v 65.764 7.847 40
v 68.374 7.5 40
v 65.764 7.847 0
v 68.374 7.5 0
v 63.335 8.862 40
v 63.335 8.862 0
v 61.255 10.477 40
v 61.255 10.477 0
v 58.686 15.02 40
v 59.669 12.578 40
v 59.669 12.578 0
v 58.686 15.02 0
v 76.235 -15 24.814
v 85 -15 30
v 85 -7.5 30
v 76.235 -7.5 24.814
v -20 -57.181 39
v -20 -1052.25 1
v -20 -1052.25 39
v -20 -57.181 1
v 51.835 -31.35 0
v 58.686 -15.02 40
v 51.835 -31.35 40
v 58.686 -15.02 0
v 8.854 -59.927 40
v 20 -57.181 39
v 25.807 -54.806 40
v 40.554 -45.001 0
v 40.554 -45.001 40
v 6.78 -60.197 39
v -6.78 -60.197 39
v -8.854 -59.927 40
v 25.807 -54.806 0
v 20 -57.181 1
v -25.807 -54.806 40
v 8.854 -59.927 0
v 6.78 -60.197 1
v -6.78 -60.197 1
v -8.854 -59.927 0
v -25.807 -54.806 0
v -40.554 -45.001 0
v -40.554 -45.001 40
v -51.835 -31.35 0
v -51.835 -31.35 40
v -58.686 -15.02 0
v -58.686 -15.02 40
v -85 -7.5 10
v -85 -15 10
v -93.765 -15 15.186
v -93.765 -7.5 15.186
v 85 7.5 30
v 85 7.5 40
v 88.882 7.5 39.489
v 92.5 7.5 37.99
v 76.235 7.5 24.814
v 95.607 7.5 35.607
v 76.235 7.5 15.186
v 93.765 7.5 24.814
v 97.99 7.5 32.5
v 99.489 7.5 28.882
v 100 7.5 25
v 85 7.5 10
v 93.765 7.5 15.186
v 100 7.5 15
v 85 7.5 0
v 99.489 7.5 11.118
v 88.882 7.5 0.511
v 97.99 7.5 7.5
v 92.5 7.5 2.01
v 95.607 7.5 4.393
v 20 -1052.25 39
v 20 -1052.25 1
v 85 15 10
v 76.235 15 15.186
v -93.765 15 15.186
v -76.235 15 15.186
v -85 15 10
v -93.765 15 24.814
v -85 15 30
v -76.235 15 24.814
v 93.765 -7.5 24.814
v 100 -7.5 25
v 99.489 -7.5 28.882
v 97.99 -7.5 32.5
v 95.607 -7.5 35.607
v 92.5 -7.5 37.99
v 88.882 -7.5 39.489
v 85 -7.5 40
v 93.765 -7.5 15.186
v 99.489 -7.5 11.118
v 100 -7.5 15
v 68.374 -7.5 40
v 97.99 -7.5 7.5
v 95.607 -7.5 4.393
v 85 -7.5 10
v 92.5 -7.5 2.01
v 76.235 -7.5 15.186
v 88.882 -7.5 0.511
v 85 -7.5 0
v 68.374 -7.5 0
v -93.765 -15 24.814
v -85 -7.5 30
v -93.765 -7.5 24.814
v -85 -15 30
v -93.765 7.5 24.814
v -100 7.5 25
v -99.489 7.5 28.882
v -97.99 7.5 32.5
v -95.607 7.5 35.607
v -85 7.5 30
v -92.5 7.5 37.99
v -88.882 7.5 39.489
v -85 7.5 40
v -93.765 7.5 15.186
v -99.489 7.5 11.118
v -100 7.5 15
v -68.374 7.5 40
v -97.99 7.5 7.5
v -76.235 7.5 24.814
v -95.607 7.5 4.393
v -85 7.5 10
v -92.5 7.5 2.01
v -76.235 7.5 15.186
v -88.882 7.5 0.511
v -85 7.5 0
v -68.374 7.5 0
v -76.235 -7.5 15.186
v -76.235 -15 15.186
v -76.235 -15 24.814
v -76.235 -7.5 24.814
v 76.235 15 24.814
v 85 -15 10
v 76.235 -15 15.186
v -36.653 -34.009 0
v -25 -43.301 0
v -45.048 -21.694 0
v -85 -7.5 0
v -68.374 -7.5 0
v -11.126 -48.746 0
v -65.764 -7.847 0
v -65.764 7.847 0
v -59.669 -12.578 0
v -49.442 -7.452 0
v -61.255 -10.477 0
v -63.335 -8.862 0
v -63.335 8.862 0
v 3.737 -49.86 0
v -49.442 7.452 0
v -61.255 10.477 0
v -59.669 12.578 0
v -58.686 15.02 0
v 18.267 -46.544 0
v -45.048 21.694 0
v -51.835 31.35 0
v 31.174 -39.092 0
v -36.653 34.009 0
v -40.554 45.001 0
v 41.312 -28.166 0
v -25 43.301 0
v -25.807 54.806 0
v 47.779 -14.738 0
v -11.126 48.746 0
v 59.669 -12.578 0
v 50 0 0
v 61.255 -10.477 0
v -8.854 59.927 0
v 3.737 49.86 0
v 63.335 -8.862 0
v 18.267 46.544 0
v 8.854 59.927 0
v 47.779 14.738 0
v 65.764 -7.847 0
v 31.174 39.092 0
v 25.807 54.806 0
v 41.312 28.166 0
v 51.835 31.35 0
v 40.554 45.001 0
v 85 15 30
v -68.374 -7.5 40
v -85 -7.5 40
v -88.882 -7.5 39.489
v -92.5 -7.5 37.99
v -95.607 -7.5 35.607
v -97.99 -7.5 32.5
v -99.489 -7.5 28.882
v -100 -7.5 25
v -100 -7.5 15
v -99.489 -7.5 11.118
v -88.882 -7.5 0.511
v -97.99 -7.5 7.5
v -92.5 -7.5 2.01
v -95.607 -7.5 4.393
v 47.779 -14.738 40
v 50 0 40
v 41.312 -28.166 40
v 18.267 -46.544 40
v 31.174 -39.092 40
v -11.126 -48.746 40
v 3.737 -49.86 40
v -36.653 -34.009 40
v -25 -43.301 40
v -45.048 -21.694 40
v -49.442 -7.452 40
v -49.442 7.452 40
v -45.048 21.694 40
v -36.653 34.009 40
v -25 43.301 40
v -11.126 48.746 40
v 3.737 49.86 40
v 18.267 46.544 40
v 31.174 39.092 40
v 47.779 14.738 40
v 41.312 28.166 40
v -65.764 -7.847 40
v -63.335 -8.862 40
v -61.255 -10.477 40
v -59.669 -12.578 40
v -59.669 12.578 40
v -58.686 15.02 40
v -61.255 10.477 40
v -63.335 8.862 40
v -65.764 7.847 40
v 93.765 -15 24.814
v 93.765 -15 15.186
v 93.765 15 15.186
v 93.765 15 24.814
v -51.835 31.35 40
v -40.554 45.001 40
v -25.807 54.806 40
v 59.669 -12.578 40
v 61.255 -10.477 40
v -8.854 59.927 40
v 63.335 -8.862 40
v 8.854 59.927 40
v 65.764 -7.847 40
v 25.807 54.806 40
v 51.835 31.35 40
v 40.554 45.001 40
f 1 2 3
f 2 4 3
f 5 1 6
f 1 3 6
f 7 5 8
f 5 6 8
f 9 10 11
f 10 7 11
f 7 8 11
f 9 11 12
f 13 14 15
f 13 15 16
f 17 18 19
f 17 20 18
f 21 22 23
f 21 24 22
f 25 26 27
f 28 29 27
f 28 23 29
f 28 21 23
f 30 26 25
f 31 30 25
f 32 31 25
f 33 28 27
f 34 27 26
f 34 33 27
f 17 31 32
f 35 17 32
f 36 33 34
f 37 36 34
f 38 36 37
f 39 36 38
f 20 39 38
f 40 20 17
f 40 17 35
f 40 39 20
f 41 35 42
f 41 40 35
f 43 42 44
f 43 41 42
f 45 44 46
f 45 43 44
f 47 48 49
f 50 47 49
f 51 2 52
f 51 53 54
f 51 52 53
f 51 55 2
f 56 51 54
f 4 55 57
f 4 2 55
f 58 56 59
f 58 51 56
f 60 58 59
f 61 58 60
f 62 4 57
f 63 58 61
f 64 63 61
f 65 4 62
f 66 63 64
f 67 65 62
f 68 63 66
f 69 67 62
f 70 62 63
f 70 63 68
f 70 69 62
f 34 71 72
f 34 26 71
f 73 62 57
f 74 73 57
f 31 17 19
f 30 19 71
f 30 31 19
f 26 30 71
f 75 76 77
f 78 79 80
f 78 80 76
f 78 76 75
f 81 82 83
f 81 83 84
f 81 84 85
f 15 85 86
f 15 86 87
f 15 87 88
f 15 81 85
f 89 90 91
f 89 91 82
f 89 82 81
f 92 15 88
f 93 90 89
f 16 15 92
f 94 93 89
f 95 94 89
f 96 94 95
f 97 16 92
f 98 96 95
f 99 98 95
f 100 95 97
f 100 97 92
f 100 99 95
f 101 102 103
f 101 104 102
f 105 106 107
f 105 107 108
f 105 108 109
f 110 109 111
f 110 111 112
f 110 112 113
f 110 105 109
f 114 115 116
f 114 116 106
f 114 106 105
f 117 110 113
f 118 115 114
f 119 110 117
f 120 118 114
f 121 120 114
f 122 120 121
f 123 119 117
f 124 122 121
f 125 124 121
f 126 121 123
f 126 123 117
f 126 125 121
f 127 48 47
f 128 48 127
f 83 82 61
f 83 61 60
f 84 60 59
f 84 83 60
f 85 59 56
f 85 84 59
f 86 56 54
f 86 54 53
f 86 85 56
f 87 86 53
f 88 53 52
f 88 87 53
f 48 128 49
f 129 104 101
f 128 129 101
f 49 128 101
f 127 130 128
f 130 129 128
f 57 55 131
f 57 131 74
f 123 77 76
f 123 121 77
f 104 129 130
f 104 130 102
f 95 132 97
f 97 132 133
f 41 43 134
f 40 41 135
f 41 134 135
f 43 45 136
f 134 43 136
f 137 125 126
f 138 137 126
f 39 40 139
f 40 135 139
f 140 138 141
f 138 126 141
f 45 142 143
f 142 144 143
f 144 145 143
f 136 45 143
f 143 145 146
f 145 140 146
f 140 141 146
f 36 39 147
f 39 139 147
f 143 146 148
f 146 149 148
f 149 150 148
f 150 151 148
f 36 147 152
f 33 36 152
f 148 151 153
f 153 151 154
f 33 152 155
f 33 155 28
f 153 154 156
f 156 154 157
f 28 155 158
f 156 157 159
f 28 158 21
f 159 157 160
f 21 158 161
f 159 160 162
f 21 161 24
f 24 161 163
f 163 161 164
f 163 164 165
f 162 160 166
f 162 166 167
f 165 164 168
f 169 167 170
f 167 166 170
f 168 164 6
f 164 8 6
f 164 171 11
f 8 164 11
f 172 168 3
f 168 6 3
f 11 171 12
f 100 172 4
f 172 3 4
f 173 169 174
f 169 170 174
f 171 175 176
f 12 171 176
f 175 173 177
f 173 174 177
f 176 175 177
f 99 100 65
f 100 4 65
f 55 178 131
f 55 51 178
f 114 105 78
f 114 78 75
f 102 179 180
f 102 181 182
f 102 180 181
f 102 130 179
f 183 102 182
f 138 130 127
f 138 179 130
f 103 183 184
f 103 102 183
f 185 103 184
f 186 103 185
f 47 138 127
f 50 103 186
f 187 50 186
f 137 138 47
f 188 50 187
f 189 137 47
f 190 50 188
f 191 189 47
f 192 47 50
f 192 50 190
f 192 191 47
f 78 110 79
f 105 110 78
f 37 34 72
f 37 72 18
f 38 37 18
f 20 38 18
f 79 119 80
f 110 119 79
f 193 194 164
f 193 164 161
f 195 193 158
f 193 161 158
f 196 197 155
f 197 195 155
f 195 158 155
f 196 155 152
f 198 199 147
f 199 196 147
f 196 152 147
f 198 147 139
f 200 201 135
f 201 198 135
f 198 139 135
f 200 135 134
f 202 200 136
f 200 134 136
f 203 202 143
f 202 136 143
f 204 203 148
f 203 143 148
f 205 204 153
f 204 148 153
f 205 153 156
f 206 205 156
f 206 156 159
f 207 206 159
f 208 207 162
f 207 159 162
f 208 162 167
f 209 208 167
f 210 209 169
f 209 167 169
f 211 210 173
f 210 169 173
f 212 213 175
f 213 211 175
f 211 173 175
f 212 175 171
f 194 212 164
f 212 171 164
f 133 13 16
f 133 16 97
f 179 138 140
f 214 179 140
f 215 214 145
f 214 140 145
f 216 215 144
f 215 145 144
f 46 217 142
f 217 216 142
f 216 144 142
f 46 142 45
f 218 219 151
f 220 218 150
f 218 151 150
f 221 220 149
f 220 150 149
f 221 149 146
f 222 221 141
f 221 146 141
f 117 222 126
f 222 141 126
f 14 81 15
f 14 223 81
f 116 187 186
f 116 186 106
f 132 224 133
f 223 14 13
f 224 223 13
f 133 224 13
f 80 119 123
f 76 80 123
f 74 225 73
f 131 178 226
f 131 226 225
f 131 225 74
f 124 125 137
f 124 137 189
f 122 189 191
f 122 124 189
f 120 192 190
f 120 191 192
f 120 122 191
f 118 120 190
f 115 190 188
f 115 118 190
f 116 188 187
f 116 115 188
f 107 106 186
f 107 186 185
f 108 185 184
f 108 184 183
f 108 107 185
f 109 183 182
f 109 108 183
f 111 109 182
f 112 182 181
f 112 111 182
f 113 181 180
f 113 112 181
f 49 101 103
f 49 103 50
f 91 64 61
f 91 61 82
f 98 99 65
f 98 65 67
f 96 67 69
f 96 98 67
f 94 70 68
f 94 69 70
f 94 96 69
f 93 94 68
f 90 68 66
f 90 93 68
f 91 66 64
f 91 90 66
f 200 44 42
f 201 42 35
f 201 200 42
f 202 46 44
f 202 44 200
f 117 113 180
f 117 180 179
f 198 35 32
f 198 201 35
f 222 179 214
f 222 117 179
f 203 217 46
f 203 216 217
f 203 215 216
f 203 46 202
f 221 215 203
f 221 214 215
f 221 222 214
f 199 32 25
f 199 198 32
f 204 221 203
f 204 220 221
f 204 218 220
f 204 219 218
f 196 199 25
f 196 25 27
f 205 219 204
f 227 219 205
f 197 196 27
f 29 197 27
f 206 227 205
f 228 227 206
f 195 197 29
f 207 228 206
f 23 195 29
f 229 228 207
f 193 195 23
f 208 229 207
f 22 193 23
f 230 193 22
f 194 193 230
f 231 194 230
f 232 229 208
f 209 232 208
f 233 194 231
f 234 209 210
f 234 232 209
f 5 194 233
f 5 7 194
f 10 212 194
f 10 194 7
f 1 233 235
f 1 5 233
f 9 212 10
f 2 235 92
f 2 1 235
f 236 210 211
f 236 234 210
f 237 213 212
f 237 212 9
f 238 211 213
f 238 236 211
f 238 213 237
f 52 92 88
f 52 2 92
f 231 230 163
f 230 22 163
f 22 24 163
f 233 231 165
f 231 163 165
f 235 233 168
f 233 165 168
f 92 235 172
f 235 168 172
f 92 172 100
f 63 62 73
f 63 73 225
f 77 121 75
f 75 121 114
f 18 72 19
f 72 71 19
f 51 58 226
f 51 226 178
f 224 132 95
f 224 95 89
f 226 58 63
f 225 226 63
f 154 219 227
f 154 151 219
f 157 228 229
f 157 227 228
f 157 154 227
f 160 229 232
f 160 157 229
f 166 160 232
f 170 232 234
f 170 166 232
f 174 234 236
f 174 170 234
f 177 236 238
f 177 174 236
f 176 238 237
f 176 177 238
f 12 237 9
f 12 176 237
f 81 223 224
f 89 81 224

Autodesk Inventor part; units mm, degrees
ref_plane "YZ Plane" through (0, 0, 0) normal (1, 0, 0) x (0, 1, 0)
ref_plane "XY Plane" through (0, 0, 0) normal (0, 0, 1) x (1, 0, 0)
sketch "Skizze1" plane through (0, 0, 0) normal (0, 0, 1) x (1, 0, 0)
  circle A0 centre (0, 0) radius 50
  line L0 (100, 7.5) -> (100, -7.5)
  line L1 (-100, -7.5) -> (-100, 7.5)
  line L2 (-100, 7.5) -> (-68.374, 7.5)
  line L3 (68.374, 7.5) -> (100, 7.5)
  line L4 (100, -7.5) -> (68.374, -7.5)
  line L5 (-68.374, -7.5) -> (-100, -7.5)
  arc A1 (-58.6863, -15.0205) -> (58.6863, -15.0205) centre (0, 0) ccw
  arc A2 (58.6863, 15.0205) -> (-58.6863, 15.0205) centre (0, 0) ccw
  arc A3 (-68.374, 7.5) -> (-58.6863, 15.0205) centre (-68.374, 17.5) ccw
  arc A4 (-58.6863, -15.0205) -> (-68.374, -7.5) centre (-68.374, -17.5) ccw
  arc A5 (58.6863, 15.0205) -> (68.374, 7.5) centre (68.374, 17.5) ccw
  arc A6 (68.374, -7.5) -> (58.6863, -15.0205) centre (68.374, -17.5) ccw
  point P0 (-60.1119, 7.5)
  point P1 (60.1119, 7.5)
  point P2 (60.1119, -7.5)
  point P3 (-60.1119, -7.5)
  point P4 (-84.187, 7.5)
  point P5 (84.187, 7.5)
  point P6 (84.187, -7.5)
  point P7 (-84.187, -7.5)
  dimension "d1" = 100
  dimension "d4" = 100
  dimension "d5" = 100
  dimension "d6" = 10
  dimension "d7" = 7.5
  dimension "d8" = 7.5
extrude "Extrusion1" add sketch "Skizze1" along normal blind 40
fillet "Rundung1" radius 15 4 edges at (100, 0, 40) (100, 0, 0) (-100, 0, 40) (-100, 0, 0)
sketch "Skizze3" plane through (0, 0, 0) normal (0, 1, 0) x (-1, 0, 0)
  circle A0 centre (-85, 20) radius 10 construction
  line L0 (-85, 10) -> (-93.7649, 15.1858)
  line L1 (-93.7649, 24.8142) -> (-85, 30)
  line L2 (-85, 30) -> (-76.2351, 24.8142)
  line L3 (-76.2351, 24.8142) -> (-76.2351, 15.1858)
  line L4 (-85, 10) -> (-76.2351, 15.1858)
  line L5 (-93.7649, 24.8142) -> (-93.7649, 15.1858)
  arc A1 (-100, 15) -> (-85, 0) centre (-85, 15) ccw projected
  line L6 (-85, 0) -> (-68.374, 0) projected
  line L7 (-68.374, 0) -> (-68.374, 40) projected
  line L8 (-85, 40) -> (-68.374, 40) projected
  arc A2 (-85, 40) -> (-100, 25) centre (-85, 25) ccw projected
  line L9 (-100, 15) -> (-100, 25) projected
  arc A3 (85, 0) -> (100, 15) centre (85, 15) ccw projected
  line L10 (100, 15) -> (100, 25) projected
  arc A4 (100, 25) -> (85, 40) centre (85, 25) ccw projected
  line L11 (68.374, 40) -> (85, 40) projected
  line L12 (68.374, 0) -> (68.374, 40) projected
  line L13 (68.374, 0) -> (85, 0) projected
  line L14 (-85, 15) -> (-85, 25) construction
  line L15 (85, 15) -> (85, 25) construction
  circle A5 centre (85, 20) radius 10 construction
  line L16 (85, 10) -> (76.2351, 15.1858)
  line L17 (76.2351, 24.8142) -> (85, 30)
  line L18 (85, 30) -> (93.7649, 24.8142)
  line L19 (93.7649, 24.8142) -> (93.7649, 15.1858)
  line L20 (85, 10) -> (93.7649, 15.1858)
  line L21 (76.2351, 24.8142) -> (76.2351, 15.1858)
  line L22 (85, 15) -> (85, 25) construction
  point P0 (0, 0)
  point P1 (85, 20)
  dimension "d12" = 20
  dimension "d13" = 20
extrude "Extrusion2" add sketch "Skizze3" along normal mid plane 30 contours L0 L5 L1 L2 L3 L4 | L16 L21 L17 L18 L19 L20
ref_plane "Arbeitsebene1" through (0, -52.25, 0) normal (0, 1, 0) x (-1, 0, 0)
sketch "Skizze4" plane through (0, -52.25, 0) normal (0, 1, 0) x (-1, 0, 0)
  line L0 (20, 39) -> (-20, 39)
  line L1 (-20, 39) -> (-20, 1)
  line L2 (-20, 1) -> (20, 1)
  line L3 (20, 1) -> (20, 39)
  point P0 (0, 0)
  dimension "d22" = 1
  dimension "d23" = 38
  dimension "d24" = 20
  dimension "d25" = 20
extrude "Extrusion3" add sketch "Skizze4" against normal blind 1000
properties part number "DN80-Rohrschelle-Staender"
